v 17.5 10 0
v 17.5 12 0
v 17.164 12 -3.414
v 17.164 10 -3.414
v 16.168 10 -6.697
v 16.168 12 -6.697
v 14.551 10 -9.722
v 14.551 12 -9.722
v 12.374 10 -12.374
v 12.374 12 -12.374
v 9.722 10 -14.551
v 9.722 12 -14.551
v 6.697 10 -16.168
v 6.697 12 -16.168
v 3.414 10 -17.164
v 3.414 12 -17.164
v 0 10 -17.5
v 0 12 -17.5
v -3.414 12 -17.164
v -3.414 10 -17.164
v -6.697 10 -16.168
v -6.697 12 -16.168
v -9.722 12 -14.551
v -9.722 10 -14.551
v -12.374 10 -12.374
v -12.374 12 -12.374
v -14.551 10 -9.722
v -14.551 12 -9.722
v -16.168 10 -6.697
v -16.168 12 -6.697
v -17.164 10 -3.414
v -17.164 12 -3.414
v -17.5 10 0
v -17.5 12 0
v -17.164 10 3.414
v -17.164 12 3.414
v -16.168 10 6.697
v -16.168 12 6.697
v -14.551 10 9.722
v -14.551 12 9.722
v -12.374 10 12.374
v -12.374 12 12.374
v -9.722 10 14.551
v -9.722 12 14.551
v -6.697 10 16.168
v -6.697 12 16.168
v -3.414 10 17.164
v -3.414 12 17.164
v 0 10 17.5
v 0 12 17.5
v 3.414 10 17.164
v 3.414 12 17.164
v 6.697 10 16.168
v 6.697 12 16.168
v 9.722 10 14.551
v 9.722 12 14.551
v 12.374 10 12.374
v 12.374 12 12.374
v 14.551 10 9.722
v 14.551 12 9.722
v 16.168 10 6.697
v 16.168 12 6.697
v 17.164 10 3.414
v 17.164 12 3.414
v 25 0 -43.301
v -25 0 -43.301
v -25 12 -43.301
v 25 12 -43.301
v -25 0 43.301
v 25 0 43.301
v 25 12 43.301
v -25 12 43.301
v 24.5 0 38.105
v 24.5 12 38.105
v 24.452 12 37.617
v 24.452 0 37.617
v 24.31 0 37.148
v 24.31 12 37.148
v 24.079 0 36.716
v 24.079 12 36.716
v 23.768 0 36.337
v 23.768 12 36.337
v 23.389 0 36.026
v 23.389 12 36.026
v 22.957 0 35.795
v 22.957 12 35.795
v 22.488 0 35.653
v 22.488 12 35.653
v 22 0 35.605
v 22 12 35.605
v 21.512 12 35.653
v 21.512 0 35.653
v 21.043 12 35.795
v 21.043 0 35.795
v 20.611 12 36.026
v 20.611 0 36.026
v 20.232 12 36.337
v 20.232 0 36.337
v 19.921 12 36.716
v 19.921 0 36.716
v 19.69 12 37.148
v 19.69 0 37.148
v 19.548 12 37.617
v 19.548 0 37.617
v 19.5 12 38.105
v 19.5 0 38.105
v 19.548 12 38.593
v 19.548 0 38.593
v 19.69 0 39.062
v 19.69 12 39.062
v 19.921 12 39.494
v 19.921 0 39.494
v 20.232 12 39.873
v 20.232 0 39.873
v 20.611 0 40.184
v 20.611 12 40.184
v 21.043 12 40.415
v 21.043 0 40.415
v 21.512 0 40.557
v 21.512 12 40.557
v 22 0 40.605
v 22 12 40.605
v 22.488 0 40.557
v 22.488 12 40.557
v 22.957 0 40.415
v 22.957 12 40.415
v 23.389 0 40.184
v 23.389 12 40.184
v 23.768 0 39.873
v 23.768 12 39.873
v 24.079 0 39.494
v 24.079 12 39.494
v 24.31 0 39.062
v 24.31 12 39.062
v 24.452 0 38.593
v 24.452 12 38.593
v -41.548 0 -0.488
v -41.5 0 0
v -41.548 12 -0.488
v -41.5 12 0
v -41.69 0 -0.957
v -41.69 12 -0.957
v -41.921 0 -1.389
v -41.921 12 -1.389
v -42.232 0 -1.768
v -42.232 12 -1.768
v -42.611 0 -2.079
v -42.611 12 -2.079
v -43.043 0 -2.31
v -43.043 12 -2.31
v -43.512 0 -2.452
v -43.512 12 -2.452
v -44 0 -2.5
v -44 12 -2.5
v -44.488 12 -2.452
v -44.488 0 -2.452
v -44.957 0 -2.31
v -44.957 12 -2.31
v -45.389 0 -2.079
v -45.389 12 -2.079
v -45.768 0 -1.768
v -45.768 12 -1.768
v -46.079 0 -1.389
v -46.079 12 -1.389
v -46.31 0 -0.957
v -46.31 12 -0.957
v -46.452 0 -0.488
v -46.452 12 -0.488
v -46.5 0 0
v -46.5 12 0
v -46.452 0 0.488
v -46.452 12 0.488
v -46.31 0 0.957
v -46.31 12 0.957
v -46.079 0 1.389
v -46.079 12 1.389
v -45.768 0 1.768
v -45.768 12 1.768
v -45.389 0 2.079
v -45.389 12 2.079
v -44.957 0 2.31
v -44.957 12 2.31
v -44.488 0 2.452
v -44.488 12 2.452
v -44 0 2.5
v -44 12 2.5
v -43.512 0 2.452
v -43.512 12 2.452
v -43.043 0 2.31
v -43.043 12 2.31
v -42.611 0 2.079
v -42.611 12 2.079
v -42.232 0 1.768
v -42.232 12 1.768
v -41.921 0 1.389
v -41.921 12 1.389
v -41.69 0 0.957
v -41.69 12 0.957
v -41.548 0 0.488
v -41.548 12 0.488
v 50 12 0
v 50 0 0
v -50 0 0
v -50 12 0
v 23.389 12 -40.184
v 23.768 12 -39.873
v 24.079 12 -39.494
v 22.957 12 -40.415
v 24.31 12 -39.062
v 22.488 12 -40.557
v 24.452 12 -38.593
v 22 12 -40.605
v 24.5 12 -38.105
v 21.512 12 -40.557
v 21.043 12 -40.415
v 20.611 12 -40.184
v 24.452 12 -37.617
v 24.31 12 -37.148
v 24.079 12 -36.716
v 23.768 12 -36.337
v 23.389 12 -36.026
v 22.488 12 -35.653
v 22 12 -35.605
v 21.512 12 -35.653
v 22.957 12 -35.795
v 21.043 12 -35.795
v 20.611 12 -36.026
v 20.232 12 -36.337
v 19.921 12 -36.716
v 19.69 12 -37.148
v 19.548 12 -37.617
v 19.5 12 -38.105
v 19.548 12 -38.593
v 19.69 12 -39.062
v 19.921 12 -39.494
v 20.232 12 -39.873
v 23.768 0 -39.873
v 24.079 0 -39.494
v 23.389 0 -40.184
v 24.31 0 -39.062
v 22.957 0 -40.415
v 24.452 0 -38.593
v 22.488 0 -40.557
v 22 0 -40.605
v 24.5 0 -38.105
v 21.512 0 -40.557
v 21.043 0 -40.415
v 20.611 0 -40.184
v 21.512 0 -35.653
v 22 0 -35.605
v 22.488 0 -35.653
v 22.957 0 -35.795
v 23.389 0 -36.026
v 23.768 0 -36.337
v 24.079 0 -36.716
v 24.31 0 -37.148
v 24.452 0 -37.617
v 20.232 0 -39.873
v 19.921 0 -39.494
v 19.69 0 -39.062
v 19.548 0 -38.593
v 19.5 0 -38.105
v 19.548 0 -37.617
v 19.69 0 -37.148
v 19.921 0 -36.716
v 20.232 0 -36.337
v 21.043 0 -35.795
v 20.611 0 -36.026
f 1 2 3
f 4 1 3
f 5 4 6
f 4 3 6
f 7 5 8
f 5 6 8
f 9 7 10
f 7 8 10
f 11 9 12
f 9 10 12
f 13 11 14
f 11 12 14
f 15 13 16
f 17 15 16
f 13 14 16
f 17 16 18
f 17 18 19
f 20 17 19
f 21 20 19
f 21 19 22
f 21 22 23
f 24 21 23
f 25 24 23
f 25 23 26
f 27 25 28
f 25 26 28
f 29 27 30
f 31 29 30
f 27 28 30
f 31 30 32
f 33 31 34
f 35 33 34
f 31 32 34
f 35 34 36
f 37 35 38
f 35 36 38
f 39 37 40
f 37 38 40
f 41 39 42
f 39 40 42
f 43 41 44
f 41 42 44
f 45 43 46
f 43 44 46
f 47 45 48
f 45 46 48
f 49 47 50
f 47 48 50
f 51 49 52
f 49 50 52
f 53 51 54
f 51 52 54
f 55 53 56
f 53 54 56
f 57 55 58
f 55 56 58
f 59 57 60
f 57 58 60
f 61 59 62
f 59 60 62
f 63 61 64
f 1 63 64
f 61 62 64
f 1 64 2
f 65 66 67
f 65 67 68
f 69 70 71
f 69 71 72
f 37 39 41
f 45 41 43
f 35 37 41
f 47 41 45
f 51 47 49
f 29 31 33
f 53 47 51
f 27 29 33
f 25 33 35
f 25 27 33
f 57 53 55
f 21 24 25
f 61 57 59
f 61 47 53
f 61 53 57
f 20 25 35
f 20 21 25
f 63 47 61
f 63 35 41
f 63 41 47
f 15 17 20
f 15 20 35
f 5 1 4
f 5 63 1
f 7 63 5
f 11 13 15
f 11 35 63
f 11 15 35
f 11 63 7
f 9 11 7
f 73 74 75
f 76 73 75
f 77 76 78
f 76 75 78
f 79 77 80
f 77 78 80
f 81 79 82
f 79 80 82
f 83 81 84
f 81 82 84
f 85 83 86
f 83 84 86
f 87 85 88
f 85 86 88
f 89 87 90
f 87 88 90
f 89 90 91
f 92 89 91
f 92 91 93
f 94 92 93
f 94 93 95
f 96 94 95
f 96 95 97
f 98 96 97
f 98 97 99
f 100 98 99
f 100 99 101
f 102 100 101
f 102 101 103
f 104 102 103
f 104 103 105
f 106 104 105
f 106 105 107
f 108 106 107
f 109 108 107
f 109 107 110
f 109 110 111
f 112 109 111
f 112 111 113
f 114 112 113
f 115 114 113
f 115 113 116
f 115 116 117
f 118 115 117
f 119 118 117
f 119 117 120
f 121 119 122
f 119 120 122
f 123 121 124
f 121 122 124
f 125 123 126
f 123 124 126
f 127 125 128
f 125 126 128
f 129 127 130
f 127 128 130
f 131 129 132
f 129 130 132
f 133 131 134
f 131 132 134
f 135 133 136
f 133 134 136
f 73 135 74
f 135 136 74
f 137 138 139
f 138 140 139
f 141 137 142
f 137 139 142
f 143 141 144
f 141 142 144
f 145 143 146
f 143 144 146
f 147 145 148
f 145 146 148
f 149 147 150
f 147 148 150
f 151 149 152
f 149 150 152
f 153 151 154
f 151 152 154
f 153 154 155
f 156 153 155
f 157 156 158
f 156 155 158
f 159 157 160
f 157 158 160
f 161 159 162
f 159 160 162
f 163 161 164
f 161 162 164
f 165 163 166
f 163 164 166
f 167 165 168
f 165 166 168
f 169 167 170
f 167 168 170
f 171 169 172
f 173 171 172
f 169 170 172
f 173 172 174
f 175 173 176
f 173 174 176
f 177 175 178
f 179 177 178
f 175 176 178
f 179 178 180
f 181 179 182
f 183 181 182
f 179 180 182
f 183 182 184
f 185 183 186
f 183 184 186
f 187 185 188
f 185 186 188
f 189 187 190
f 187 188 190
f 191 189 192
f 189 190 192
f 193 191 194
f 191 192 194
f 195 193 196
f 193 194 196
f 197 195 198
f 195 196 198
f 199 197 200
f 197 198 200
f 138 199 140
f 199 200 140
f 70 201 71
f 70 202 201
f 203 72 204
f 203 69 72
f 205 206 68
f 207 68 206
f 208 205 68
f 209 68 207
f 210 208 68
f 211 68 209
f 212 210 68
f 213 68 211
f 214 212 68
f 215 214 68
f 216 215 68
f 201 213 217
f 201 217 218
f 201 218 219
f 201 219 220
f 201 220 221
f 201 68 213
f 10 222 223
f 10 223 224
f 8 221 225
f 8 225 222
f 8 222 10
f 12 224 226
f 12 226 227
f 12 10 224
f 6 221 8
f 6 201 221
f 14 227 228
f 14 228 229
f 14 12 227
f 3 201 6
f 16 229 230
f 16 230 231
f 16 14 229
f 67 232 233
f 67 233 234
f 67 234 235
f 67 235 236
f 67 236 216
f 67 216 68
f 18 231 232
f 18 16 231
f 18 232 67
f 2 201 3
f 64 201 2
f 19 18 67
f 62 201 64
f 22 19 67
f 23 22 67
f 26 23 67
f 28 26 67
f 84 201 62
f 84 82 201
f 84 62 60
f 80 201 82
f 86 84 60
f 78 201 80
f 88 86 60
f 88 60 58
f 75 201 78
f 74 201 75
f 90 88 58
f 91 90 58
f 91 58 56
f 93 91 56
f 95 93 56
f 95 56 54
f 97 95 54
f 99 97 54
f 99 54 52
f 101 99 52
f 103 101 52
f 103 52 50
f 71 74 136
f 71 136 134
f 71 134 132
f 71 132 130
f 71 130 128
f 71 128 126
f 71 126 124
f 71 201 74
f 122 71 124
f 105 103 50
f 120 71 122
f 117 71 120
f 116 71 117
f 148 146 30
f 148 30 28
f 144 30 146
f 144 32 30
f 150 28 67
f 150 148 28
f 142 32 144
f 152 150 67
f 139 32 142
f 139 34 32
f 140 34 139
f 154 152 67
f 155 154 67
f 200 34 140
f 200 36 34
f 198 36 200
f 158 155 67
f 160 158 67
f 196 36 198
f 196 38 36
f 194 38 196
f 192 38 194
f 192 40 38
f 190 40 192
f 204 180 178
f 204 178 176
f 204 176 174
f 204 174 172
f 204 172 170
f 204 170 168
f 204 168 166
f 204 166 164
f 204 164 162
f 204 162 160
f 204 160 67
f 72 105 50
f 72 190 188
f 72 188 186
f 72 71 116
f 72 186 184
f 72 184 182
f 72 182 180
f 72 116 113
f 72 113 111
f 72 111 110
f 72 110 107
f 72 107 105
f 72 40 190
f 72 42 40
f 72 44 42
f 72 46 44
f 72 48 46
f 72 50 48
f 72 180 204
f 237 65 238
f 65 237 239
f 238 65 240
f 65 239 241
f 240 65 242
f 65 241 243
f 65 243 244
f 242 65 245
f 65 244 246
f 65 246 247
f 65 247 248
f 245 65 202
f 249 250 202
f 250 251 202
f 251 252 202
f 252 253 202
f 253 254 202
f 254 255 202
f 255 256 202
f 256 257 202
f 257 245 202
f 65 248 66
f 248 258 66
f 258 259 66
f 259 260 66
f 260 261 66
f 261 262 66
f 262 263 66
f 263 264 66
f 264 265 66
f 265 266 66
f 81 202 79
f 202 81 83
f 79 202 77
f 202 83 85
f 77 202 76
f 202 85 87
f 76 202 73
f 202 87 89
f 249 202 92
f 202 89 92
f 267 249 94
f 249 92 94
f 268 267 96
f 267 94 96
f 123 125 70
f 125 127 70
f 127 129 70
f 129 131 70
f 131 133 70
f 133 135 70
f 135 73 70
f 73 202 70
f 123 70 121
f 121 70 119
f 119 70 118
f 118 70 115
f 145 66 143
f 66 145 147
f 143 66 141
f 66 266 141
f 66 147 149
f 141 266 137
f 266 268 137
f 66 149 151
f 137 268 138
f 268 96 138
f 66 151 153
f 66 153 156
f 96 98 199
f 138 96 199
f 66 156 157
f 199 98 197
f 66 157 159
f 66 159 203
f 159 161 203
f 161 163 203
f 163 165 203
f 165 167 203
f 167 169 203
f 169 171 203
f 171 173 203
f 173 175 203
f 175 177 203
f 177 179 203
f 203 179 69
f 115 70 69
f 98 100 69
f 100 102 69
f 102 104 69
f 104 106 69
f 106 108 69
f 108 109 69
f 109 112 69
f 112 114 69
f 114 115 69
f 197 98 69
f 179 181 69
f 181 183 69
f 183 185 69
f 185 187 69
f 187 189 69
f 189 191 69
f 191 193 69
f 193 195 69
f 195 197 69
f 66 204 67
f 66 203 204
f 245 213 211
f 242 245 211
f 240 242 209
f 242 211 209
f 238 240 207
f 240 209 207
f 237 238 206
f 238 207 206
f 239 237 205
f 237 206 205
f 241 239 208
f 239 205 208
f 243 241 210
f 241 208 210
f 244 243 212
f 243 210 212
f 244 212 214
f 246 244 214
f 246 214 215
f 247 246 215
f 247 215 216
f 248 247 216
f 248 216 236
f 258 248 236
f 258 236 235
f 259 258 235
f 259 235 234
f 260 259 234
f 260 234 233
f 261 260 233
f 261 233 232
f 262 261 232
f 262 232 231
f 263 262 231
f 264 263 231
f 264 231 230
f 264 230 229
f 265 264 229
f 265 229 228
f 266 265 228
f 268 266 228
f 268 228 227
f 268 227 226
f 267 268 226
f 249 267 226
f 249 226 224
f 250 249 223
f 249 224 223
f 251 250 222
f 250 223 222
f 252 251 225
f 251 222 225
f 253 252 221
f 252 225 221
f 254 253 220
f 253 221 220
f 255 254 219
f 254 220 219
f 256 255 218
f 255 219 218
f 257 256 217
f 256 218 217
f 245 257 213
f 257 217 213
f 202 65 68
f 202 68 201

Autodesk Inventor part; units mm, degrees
ref_plane "YZ Plane" through (0, 0, 0) normal (1, 0, 0) x (0, 1, 0)
sketch "Sketch1" plane through (0, 0, 0) normal (0, 1, 0) x (-1, 0, 0)
  line L0 (-25, -43.3013) -> (-50, 0)
  line L1 (-50, 0) -> (-25, 43.3013)
  line L2 (-25, 43.3013) -> (25, 43.3013)
  line L3 (25, 43.3013) -> (50, 0)
  line L4 (50, 0) -> (25, -43.3013)
  line L5 (25, -43.3013) -> (-25, -43.3013)
  point P0 (0, 0)
  point P1 (0, 0)
  dimension "d0" = 50
extrude "Extrusion1" add sketch "Sketch1" along normal blind 12
ref_plane "Work Plane1" through (0, 12, 0) normal (0, 1, 0) x (1, 0, 0)
sketch "Sketch2" plane through (0, 12, 0) normal (0, 1, 0) x (1, 0, 0)
  circle A0 centre (0, 0) radius 17.5
  dimension "d4" = 35
extrude "Extrusion2" cut sketch "Sketch2" against normal blind 2
ref_plane "Work Plane2" through (0, 12, 0) normal (0, 1, 0) x (1, 0, 0)
sketch "Sketch3" plane through (0, 12, 0) normal (0, 1, 0) x (1, 0, 0)
  line L0 (-25, 43.3013) -> (-50, 0) projected
  line L1 (-50, 0) -> (-44, 0)
  circle A0 centre (-44, 0) radius 2.5
  line L2 (50, 0) -> (25, 43.3013) projected
  line L3 (25, 43.3013) -> (22, 38.1051)
  circle A1 centre (22, 38.1051) radius 2.5
  line L4 (25, -43.3013) -> (50, 0) projected
  line L5 (25, -43.3013) -> (22, -38.1051)
  circle A2 centre (22, -38.1051) radius 2.5
  point P0 (0, 0)
  dimension "d8" = 6
  dimension "d9" = 5
  dimension "d10" = 6
  dimension "d11" = 5
  dimension "d13" = 6
  dimension "d14" = 5
extrude "Extrusion3" cut sketch "Sketch3" against normal through all
properties part number "sensor 3"
